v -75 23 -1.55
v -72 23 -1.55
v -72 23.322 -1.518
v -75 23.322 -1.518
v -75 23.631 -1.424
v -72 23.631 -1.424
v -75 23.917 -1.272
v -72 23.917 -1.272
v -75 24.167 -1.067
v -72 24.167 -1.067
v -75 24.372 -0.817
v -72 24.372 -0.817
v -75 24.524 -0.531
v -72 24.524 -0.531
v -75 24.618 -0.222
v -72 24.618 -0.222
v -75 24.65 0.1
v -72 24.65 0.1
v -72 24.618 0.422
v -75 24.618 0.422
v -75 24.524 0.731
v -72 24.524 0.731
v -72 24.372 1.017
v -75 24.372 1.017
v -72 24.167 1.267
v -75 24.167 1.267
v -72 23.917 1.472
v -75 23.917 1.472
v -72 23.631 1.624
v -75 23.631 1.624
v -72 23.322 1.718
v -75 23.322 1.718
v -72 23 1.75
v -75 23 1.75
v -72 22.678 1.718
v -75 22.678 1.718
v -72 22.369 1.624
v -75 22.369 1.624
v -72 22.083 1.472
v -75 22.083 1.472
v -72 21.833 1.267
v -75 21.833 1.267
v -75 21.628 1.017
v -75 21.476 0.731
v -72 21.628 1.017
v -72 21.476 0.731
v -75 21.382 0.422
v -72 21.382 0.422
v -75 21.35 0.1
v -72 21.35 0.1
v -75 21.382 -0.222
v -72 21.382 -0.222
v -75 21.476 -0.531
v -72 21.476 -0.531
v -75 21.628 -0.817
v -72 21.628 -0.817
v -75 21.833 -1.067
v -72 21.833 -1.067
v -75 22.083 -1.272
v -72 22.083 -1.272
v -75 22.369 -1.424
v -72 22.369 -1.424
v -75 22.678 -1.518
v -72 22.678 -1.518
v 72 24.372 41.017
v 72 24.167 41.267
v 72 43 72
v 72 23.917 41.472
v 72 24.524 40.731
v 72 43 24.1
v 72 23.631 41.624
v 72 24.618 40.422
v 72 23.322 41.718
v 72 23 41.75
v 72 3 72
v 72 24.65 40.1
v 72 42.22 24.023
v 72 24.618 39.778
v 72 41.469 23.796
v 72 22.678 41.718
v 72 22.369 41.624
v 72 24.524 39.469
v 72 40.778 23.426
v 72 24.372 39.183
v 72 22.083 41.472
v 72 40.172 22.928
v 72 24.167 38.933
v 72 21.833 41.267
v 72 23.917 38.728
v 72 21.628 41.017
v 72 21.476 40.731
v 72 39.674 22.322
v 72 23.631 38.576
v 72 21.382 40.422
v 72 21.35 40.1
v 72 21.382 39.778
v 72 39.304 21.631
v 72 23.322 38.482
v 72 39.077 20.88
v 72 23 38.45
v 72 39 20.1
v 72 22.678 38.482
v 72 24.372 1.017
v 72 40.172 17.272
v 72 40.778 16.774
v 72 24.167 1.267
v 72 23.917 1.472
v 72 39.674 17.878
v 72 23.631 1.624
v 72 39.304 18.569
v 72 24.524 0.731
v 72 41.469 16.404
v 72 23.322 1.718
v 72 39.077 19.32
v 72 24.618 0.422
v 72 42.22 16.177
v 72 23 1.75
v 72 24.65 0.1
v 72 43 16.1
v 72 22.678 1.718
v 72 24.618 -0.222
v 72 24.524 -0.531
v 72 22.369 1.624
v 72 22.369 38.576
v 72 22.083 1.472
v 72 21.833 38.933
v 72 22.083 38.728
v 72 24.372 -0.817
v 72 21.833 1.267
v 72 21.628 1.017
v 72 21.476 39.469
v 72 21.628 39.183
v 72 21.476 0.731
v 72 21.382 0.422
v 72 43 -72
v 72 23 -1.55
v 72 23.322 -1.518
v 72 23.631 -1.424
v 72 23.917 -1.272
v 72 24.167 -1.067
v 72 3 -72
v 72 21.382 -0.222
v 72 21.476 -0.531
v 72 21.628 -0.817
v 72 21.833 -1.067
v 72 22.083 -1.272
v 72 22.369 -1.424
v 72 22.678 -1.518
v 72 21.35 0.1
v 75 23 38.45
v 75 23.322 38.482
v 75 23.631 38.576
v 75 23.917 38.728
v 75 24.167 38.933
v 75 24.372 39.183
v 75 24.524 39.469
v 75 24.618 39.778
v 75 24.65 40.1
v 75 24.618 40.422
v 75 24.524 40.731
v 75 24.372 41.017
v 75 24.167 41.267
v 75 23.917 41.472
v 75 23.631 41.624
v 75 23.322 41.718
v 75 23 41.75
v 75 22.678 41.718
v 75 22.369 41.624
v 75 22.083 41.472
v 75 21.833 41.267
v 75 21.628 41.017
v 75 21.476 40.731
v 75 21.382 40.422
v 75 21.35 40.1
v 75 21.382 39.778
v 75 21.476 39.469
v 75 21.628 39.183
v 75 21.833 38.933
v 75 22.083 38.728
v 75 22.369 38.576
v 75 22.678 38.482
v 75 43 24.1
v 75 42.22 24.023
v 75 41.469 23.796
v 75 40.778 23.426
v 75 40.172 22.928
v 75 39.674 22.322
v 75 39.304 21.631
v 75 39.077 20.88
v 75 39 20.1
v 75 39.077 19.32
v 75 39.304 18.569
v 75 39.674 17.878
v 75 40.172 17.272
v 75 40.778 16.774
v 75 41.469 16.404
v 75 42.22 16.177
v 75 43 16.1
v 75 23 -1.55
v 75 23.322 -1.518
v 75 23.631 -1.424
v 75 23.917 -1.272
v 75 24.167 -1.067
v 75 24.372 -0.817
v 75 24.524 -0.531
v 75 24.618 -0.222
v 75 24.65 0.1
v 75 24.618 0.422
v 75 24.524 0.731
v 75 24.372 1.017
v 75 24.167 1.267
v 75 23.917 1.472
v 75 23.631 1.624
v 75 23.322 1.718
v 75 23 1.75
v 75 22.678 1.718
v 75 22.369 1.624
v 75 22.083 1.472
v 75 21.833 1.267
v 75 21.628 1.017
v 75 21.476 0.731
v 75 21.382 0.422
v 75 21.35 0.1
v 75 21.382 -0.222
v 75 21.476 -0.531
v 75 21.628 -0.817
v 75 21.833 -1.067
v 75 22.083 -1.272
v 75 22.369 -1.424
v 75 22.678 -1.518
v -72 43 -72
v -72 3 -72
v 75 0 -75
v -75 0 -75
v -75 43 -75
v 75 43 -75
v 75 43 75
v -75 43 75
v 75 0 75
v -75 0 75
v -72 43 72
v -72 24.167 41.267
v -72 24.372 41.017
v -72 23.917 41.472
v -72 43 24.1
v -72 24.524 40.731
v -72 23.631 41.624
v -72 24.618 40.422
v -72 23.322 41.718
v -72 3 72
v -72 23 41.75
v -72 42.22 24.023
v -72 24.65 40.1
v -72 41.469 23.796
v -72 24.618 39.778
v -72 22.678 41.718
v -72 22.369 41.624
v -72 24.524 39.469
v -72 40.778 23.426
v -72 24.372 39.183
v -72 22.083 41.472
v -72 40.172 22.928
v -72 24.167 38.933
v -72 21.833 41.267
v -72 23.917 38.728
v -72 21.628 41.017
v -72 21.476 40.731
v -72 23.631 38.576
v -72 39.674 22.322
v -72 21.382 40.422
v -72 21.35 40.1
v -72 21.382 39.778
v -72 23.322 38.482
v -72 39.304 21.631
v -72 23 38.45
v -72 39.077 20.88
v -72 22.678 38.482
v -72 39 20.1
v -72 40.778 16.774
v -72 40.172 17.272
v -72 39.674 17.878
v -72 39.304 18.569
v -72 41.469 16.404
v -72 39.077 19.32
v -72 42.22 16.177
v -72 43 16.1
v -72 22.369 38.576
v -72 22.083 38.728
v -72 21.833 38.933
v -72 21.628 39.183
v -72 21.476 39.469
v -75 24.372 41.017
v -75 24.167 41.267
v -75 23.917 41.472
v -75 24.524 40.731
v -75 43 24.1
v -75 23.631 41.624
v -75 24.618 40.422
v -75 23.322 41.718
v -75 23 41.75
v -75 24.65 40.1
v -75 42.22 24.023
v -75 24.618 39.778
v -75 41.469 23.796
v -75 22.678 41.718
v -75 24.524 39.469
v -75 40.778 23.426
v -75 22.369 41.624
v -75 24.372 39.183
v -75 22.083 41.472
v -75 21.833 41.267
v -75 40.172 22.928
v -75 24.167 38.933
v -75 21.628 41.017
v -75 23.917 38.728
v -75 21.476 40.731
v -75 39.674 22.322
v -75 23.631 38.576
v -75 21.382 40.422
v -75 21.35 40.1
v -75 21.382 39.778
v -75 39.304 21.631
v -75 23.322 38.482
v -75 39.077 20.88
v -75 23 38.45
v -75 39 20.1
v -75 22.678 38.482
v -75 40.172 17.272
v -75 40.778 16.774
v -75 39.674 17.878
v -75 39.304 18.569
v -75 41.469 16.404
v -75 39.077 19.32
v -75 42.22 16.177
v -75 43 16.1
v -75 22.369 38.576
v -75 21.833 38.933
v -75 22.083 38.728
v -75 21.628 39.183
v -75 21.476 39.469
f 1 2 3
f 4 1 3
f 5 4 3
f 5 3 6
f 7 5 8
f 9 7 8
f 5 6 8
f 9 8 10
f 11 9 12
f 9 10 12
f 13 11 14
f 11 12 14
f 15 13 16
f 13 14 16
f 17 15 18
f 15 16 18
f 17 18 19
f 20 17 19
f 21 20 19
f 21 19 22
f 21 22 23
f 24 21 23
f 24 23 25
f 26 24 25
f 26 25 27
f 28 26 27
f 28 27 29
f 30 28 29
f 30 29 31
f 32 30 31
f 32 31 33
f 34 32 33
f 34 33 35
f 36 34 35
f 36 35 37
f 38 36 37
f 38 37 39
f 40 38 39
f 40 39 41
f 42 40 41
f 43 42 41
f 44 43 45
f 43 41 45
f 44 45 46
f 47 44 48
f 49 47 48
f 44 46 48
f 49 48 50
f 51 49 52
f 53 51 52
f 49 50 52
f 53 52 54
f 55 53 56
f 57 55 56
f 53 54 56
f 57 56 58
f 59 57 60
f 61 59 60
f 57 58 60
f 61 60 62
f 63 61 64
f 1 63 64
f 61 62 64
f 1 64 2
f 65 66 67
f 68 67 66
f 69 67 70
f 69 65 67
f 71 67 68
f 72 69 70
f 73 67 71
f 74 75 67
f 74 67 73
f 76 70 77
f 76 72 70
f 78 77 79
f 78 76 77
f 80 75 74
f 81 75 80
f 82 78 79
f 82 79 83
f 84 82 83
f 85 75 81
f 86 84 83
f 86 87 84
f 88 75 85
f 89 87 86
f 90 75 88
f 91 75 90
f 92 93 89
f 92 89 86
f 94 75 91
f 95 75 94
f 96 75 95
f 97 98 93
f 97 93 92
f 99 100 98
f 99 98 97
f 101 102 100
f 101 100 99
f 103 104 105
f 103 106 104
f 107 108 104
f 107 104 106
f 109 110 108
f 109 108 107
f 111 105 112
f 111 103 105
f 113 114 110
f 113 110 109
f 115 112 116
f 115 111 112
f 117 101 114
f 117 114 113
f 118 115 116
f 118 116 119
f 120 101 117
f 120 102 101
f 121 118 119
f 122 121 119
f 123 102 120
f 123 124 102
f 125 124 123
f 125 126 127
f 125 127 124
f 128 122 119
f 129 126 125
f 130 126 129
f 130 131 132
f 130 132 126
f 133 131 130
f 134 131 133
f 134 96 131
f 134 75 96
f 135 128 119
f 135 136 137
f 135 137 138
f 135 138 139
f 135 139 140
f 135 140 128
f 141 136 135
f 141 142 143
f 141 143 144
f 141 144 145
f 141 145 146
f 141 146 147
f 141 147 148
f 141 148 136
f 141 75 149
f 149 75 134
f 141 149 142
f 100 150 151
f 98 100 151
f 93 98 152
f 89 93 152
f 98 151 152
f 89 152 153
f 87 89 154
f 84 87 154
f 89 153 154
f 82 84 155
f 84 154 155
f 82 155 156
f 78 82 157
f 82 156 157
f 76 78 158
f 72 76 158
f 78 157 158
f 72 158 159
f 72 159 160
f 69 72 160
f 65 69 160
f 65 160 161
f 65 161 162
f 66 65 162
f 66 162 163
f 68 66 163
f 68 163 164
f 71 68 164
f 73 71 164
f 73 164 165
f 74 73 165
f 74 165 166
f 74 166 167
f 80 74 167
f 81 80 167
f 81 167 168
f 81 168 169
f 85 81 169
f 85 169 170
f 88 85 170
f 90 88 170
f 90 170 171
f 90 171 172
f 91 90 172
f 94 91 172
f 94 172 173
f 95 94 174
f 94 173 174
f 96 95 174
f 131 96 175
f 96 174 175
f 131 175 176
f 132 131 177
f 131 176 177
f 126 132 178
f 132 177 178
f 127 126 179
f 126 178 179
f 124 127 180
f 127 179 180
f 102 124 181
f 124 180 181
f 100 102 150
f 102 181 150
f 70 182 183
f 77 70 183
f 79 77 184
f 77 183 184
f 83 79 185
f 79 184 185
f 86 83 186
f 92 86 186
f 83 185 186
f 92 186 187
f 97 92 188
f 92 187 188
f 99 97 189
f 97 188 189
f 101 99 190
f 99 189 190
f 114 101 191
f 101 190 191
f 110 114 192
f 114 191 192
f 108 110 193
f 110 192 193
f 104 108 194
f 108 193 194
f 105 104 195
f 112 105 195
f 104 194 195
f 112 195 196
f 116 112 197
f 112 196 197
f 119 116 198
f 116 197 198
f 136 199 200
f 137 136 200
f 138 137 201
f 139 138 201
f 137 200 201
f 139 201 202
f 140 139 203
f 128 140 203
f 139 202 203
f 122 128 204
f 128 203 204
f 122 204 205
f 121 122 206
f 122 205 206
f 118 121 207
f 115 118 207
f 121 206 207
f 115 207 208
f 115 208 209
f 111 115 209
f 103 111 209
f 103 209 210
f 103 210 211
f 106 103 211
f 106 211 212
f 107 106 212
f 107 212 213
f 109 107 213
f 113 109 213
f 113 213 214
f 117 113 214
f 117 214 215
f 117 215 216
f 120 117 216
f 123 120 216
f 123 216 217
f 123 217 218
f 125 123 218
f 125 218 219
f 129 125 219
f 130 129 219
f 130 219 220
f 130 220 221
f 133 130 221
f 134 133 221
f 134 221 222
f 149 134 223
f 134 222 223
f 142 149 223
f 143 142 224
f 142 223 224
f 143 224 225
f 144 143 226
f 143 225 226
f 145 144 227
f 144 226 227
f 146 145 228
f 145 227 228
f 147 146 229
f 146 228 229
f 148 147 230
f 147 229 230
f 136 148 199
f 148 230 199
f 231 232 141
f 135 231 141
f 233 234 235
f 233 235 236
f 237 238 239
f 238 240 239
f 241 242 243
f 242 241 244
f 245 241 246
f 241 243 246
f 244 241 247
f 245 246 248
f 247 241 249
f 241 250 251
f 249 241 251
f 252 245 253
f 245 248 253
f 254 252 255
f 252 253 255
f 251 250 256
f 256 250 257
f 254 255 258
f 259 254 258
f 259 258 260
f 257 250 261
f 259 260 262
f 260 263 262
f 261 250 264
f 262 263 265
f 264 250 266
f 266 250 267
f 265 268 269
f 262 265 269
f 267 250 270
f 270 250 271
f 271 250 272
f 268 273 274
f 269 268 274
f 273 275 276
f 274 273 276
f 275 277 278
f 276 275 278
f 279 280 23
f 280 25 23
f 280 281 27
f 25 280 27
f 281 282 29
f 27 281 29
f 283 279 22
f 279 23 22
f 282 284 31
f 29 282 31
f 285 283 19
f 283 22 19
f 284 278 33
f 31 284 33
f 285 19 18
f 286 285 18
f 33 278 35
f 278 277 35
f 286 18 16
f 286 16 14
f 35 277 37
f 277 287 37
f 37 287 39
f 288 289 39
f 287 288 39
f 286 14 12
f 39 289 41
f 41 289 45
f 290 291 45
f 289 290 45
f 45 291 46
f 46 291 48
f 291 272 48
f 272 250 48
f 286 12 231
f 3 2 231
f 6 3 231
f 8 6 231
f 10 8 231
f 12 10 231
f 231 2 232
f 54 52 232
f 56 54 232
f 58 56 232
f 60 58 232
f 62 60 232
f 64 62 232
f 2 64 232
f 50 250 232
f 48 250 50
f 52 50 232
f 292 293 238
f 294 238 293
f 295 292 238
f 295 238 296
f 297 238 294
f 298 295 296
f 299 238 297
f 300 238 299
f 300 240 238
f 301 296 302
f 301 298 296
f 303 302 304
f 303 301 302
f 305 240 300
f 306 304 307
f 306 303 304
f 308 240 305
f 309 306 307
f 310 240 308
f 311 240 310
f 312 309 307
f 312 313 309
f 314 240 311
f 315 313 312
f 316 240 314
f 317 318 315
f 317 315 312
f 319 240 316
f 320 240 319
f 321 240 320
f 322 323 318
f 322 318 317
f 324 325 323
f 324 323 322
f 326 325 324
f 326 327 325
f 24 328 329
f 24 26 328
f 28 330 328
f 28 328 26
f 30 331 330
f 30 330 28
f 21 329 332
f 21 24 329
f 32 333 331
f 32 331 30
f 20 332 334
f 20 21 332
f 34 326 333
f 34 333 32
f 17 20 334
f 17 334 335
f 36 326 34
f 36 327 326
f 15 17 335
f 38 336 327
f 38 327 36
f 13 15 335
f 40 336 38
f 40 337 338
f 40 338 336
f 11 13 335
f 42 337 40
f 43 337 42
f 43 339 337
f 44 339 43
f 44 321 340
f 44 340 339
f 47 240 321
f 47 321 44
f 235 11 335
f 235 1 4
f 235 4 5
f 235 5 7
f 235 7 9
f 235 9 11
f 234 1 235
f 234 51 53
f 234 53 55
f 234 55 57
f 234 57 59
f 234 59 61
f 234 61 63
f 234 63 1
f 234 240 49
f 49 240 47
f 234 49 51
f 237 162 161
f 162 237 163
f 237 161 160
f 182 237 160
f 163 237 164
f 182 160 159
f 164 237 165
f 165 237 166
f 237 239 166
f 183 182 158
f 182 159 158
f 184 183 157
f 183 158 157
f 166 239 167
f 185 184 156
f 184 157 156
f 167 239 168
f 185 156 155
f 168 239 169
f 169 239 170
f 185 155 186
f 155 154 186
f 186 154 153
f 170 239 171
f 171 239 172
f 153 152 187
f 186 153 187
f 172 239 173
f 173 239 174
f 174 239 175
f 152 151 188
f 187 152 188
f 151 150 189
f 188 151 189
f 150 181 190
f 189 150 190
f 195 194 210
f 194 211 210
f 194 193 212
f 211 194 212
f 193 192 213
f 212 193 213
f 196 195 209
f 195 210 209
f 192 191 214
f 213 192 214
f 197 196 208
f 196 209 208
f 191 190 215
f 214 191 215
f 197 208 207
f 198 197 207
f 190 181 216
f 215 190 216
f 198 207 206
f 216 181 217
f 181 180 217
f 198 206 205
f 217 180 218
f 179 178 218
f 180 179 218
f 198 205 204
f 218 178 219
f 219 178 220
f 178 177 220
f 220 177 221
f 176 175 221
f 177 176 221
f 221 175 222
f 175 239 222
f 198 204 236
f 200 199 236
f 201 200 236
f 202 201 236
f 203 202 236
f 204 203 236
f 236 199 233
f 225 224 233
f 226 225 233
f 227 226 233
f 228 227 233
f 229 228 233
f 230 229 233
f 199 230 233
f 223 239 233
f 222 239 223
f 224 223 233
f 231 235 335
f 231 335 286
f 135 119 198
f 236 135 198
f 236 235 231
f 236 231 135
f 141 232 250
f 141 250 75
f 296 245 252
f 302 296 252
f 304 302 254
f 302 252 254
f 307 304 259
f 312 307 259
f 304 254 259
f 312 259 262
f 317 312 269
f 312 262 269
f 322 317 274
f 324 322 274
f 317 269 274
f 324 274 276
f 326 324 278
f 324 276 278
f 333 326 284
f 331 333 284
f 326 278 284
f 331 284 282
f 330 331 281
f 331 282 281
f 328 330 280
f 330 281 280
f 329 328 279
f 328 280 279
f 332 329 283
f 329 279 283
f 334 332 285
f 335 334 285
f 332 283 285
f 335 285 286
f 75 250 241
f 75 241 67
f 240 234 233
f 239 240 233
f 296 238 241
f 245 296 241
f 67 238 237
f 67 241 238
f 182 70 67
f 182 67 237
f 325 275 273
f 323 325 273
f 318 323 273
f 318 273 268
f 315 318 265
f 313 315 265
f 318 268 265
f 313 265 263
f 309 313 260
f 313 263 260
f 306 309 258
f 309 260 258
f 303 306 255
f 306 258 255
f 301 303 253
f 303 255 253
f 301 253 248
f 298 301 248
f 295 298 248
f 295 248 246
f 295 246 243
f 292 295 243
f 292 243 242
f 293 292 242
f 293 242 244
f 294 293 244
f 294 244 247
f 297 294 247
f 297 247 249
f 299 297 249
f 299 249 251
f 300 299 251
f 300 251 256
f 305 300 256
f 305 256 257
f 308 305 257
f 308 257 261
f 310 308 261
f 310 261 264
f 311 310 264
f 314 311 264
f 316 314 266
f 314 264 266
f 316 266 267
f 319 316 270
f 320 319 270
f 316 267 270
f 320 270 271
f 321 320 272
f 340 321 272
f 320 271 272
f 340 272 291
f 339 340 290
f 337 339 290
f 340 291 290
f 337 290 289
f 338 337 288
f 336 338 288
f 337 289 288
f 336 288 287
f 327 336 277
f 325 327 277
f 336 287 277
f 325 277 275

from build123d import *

# Parameters (mm, degrees)
SKETCH_1_W          = 150
SKETCH_1_H          = 150
EXTRUDE_1_DEPTH     = 3
SKETCH_2_W          = 150
SKETCH_2_H          = 150
SKETCH_2_W_2        = 144
SKETCH_2_H_2        = 144
EXTRUDE_2_DEPTH     = 40
SKETCH_3_R          = 4
SKETCH_3_R_2        = 1.65
CUT_EXTRUDE_1_DEPTH = 174.130008953


with BuildPart() as part:
    # 草图1 → 凸台-拉伸1 (new body)
    with BuildSketch(Plane(origin=(0, 0, 0), x_dir=(1, 0, 0), z_dir=(0, 1, 0))):
        Rectangle(SKETCH_1_W, SKETCH_1_H)
    extrude(amount=EXTRUDE_1_DEPTH)

    # 草图2 → 凸台-拉伸2 (add)
    with BuildSketch(Plane(origin=(0, 3, 0), x_dir=(1, 0, 0), z_dir=(0, 1, 0))):
        Rectangle(SKETCH_2_W, SKETCH_2_H)
        Rectangle(SKETCH_2_W_2, SKETCH_2_H_2, mode=Mode.SUBTRACT)
    extrude(amount=EXTRUDE_2_DEPTH)

    # 草图3 → 切除-拉伸1 (cut, through all)
    with BuildSketch(Plane(origin=(75, 0, 0), x_dir=(0, 0, -1), z_dir=(1, 0, 0))):
        with Locations((-20.1, 43)):
            Circle(SKETCH_3_R)
        with Locations((-0.1, 23)):
            Circle(SKETCH_3_R_2)
        with Locations((-40.1, 23)):
            Circle(SKETCH_3_R_2)
    extrude(amount=-CUT_EXTRUDE_1_DEPTH, mode=Mode.SUBTRACT)


solid = part.part
